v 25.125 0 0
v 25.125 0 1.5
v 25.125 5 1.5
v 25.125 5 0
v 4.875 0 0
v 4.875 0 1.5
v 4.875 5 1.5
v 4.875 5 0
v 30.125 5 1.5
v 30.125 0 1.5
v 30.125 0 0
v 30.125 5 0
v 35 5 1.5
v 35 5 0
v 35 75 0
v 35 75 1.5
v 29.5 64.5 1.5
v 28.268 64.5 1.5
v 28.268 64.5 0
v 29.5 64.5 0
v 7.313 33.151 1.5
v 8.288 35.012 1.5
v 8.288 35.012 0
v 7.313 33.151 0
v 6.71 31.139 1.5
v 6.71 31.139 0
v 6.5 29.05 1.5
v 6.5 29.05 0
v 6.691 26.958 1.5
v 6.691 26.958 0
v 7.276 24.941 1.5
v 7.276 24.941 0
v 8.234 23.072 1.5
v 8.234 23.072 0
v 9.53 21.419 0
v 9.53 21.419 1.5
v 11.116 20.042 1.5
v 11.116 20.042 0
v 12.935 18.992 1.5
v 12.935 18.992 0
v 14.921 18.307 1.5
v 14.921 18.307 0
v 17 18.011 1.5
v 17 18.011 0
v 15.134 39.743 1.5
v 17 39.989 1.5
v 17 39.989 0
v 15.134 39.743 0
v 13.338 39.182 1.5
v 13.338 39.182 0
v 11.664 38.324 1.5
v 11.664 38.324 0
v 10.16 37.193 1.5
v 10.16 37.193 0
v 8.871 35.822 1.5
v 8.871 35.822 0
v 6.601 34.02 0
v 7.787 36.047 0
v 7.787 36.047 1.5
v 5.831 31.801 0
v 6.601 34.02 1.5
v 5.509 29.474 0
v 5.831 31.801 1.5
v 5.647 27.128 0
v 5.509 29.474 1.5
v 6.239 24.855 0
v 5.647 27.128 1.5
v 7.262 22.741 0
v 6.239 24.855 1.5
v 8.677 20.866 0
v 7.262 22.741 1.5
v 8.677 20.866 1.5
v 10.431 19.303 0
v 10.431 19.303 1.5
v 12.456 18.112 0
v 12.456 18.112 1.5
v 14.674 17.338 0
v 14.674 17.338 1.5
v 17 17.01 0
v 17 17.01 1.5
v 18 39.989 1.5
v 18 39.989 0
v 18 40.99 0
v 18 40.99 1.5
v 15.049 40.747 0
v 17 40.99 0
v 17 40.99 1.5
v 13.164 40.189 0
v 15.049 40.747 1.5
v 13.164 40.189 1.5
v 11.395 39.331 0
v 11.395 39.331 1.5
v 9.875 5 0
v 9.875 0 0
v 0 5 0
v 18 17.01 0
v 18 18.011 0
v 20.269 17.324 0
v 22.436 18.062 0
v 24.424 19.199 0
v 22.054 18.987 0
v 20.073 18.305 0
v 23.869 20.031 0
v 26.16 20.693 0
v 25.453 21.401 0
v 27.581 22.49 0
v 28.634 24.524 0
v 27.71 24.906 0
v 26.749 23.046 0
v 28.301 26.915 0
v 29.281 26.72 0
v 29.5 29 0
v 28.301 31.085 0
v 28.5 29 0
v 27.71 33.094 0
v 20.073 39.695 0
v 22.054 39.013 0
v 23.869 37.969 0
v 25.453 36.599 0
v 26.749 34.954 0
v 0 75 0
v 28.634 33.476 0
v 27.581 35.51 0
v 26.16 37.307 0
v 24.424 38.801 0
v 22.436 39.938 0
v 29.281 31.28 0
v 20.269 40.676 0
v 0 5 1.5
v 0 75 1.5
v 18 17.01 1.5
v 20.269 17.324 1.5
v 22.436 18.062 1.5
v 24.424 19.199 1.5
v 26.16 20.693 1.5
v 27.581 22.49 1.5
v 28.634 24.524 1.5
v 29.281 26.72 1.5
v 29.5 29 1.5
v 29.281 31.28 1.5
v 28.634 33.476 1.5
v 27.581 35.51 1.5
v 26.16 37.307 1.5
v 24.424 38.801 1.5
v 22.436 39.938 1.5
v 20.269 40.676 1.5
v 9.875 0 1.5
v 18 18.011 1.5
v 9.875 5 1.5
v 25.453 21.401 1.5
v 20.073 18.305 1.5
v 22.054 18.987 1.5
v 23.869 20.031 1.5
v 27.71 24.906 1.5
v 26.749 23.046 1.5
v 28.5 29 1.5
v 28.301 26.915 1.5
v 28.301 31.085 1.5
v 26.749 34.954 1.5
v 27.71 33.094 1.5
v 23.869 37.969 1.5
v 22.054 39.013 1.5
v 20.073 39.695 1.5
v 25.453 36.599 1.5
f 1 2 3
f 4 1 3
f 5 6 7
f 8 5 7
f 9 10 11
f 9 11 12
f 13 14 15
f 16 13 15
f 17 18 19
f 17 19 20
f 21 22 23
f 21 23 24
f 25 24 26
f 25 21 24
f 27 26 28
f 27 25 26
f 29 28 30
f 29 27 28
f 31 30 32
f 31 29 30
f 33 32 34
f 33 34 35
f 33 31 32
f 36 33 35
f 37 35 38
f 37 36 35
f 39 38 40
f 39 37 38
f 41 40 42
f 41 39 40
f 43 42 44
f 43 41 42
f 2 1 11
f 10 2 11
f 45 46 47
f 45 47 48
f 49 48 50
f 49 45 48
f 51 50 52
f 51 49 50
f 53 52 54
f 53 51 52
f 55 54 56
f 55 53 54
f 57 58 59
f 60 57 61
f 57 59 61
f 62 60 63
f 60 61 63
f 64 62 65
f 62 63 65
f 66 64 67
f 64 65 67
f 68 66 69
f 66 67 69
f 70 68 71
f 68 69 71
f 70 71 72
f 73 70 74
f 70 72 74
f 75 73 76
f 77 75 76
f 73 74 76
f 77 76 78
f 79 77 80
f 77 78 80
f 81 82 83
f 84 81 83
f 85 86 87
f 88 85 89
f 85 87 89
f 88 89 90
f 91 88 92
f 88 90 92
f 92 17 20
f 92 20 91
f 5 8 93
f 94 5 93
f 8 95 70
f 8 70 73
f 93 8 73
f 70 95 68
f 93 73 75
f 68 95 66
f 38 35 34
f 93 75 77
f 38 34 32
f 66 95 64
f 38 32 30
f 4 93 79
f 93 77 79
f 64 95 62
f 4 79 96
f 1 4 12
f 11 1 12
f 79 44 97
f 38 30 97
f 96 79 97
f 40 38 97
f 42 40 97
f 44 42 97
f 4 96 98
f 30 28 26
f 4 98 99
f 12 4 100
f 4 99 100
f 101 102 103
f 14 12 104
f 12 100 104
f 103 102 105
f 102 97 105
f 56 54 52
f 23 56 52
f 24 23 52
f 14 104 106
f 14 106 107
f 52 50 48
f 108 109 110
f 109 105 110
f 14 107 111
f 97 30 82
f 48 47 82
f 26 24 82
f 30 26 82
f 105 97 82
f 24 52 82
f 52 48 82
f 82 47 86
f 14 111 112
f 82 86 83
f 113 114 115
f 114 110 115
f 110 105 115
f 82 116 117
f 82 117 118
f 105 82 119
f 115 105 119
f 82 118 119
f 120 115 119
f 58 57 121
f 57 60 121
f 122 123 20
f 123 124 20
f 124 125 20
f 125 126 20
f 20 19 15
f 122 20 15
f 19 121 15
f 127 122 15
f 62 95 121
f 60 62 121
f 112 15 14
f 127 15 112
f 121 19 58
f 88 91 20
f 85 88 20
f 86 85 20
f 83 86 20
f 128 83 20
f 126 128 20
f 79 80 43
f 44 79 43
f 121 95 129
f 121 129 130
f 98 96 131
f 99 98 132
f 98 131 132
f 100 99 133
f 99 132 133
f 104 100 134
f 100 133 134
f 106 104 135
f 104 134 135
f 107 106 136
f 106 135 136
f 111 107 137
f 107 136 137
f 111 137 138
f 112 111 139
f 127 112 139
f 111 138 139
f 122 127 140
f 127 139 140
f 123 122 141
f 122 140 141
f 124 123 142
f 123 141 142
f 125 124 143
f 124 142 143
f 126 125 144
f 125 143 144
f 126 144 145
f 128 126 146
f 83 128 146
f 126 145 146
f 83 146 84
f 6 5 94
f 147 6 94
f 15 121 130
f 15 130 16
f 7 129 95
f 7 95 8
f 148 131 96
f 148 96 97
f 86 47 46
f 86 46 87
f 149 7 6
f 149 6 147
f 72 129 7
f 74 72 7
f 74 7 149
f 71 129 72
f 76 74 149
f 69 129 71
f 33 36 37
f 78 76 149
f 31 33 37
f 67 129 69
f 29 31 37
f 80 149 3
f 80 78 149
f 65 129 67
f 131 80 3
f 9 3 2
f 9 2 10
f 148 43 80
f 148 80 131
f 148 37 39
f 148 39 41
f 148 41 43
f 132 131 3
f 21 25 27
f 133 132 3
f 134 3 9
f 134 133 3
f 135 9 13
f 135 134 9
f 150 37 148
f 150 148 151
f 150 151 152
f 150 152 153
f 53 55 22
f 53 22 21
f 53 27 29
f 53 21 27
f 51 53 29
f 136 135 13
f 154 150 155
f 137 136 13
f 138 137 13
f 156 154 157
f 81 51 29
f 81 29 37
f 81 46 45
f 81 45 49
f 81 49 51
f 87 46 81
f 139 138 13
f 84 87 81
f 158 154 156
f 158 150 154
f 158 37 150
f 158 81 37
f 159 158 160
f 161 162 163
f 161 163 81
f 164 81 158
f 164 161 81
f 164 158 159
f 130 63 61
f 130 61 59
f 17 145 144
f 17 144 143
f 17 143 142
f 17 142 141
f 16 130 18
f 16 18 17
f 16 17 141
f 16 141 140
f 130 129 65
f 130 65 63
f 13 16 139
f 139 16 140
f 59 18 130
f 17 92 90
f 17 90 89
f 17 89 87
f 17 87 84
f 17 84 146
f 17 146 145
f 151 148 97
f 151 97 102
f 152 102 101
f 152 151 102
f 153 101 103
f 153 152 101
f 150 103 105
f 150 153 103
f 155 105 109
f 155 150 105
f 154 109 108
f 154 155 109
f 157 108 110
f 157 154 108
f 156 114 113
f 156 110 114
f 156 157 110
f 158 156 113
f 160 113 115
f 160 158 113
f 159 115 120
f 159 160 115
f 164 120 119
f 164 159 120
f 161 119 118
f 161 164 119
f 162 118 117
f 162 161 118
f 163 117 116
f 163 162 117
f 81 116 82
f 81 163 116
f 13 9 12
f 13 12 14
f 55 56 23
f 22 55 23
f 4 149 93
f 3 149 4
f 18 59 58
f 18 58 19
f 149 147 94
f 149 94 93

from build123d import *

# Parameters (mm, degrees)
SKIZZE1_W                        = 35
SKIZZE1_H                        = 75
AUFSATZ_LINEAR_AUSTRAGEN1_DEPTH  = 1.5
SKIZZE3_W                        = 15.25
SKIZZE3_H                        = 5
SKIZZE3_W_2                      = 4.875
SCHNITT_LINEAR_AUSTRAGEN12_DEPTH = 20
SKIZZE10_R                       = 12
SKIZZE10_R_2                     = 11
SCHNITT_LINEAR_AUSTRAGEN16_DEPTH = 1.5
SCHNITT_LINEAR_AUSTRAGEN17_DEPTH = 1.5
SKIZZE12_W                       = 1
SKIZZE12_H                       = 28.144103088
AUFSATZ_LINEAR_AUSTRAGEN7_DEPTH  = 1.5


with BuildPart() as part:
    # Skizze1 → Aufsatz-Linear austragen1 (new body)
    with BuildSketch(Plane.XY):
        with Locations((17.5, 37.5)):
            Rectangle(SKIZZE1_W, SKIZZE1_H)
    extrude(amount=AUFSATZ_LINEAR_AUSTRAGEN1_DEPTH)

    # Skizze3 → Schnitt-Linear austragen12 (cut)
    with BuildSketch(Plane.XY.offset(1.5)):
        with Locations((17.5, 2.5)):
            Rectangle(SKIZZE3_W, SKIZZE3_H)
        with Locations((32.5625, 2.5)):
            Rectangle(SKIZZE3_W_2, SKIZZE3_H)
        with Locations((2.4375, 2.5)):
            Rectangle(SKIZZE3_W_2, SKIZZE3_H)
    extrude(amount=-SCHNITT_LINEAR_AUSTRAGEN12_DEPTH, mode=Mode.SUBTRACT)

    # Skizze10 → Schnitt-Linear austragen16 (cut)
    with BuildSketch(Plane.XY.offset(1.5)):
        with Locations((17.5, 29)):
            Circle(SKIZZE10_R)
        with Locations((17.5, 29)):
            Circle(SKIZZE10_R_2, mode=Mode.SUBTRACT)
    extrude(amount=-SCHNITT_LINEAR_AUSTRAGEN16_DEPTH, mode=Mode.SUBTRACT)


with BuildPart() as schnitt_linear_austragen16_piece_1:
    # of the separate pieces the step leaves, piece 1, a body of its own (schnitt_linear_austragen16_pieces)
    add(part.part.solids().sort_by_distance((4.875, 0, 0))[0])


with BuildPart() as schnitt_linear_austragen16_piece_2:
    # of the separate pieces the step leaves, piece 2, a body of its own (schnitt_linear_austragen16_pieces)
    add(part.part.solids().sort_by_distance((28.5, 29, 0))[0])


with BuildPart() as schnitt_linear_austragen17_tool:
    # Skizze11 → Schnitt-Linear austragen17 (new body)
    with BuildSketch(Plane.XY.offset(1.5)):
        Polygon((28.268155747, 64.5), (29.5, 64.5), (8.288020016, 35.011607504), (7.787416934, 36.04739173), align=None)
    extrude(amount=-SCHNITT_LINEAR_AUSTRAGEN17_DEPTH)


with BuildPart() as schnitt_linear_austragen16_piece_1_1:
    add(schnitt_linear_austragen16_piece_1.part)

    # Schnitt-Linear austragen17: cut by schnitt_linear_austragen17_tool
    add(schnitt_linear_austragen17_tool.part, mode=Mode.SUBTRACT)



with BuildPart() as schnitt_linear_austragen16_piece_2_1:
    add(schnitt_linear_austragen16_piece_2.part)

    # Schnitt-Linear austragen17: cut by schnitt_linear_austragen17_tool
    add(schnitt_linear_austragen17_tool.part, mode=Mode.SUBTRACT)


with BuildPart() as schnitt_linear_austragen16_piece_1_2:
    add(schnitt_linear_austragen16_piece_1_1.part)

    add(schnitt_linear_austragen16_piece_2_1.part)  # Aufsatz-Linear austragen7 merges Schnitt-Linear austragen16 piece 2
    # Skizze12 → Aufsatz-Linear austragen7 (add)
    with BuildSketch(Plane.XY.offset(1.5)):
        with Locations((17.5, 28.571124528)):
            Rectangle(SKIZZE12_W, SKIZZE12_H)
    extrude(amount=-AUFSATZ_LINEAR_AUSTRAGEN7_DEPTH)


solid = schnitt_linear_austragen16_piece_1_2.part
